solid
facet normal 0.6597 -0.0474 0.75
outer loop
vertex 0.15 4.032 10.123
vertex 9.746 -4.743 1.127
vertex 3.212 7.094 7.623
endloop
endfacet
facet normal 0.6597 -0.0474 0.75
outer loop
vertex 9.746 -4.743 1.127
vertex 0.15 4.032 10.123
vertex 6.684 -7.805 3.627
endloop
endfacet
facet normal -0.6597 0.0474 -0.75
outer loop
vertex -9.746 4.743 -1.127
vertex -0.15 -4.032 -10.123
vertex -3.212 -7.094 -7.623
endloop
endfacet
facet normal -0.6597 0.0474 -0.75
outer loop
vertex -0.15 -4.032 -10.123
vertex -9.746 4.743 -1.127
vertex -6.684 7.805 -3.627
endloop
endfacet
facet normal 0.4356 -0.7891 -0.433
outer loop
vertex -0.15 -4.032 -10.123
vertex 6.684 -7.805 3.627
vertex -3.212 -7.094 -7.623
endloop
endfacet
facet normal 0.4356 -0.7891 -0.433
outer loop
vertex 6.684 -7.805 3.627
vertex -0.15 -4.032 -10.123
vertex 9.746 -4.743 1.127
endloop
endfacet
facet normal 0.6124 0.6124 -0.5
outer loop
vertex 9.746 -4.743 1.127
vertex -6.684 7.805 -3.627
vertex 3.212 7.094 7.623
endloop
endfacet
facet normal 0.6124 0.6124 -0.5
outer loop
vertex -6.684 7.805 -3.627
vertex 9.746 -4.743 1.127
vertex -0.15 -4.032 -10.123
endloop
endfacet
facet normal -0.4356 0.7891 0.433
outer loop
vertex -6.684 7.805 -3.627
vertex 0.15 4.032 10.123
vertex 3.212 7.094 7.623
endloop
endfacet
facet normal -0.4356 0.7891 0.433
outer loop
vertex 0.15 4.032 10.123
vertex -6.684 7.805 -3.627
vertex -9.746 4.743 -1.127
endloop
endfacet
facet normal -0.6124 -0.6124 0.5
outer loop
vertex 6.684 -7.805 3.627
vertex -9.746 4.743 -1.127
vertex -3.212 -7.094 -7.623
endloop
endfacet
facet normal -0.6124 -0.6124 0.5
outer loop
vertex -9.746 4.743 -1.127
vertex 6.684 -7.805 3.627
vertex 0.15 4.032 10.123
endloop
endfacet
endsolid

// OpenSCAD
// Generated by generate_scads.py
rotate([30,30,45]) {
  cube(size=[5,15,15], center=true);
}
